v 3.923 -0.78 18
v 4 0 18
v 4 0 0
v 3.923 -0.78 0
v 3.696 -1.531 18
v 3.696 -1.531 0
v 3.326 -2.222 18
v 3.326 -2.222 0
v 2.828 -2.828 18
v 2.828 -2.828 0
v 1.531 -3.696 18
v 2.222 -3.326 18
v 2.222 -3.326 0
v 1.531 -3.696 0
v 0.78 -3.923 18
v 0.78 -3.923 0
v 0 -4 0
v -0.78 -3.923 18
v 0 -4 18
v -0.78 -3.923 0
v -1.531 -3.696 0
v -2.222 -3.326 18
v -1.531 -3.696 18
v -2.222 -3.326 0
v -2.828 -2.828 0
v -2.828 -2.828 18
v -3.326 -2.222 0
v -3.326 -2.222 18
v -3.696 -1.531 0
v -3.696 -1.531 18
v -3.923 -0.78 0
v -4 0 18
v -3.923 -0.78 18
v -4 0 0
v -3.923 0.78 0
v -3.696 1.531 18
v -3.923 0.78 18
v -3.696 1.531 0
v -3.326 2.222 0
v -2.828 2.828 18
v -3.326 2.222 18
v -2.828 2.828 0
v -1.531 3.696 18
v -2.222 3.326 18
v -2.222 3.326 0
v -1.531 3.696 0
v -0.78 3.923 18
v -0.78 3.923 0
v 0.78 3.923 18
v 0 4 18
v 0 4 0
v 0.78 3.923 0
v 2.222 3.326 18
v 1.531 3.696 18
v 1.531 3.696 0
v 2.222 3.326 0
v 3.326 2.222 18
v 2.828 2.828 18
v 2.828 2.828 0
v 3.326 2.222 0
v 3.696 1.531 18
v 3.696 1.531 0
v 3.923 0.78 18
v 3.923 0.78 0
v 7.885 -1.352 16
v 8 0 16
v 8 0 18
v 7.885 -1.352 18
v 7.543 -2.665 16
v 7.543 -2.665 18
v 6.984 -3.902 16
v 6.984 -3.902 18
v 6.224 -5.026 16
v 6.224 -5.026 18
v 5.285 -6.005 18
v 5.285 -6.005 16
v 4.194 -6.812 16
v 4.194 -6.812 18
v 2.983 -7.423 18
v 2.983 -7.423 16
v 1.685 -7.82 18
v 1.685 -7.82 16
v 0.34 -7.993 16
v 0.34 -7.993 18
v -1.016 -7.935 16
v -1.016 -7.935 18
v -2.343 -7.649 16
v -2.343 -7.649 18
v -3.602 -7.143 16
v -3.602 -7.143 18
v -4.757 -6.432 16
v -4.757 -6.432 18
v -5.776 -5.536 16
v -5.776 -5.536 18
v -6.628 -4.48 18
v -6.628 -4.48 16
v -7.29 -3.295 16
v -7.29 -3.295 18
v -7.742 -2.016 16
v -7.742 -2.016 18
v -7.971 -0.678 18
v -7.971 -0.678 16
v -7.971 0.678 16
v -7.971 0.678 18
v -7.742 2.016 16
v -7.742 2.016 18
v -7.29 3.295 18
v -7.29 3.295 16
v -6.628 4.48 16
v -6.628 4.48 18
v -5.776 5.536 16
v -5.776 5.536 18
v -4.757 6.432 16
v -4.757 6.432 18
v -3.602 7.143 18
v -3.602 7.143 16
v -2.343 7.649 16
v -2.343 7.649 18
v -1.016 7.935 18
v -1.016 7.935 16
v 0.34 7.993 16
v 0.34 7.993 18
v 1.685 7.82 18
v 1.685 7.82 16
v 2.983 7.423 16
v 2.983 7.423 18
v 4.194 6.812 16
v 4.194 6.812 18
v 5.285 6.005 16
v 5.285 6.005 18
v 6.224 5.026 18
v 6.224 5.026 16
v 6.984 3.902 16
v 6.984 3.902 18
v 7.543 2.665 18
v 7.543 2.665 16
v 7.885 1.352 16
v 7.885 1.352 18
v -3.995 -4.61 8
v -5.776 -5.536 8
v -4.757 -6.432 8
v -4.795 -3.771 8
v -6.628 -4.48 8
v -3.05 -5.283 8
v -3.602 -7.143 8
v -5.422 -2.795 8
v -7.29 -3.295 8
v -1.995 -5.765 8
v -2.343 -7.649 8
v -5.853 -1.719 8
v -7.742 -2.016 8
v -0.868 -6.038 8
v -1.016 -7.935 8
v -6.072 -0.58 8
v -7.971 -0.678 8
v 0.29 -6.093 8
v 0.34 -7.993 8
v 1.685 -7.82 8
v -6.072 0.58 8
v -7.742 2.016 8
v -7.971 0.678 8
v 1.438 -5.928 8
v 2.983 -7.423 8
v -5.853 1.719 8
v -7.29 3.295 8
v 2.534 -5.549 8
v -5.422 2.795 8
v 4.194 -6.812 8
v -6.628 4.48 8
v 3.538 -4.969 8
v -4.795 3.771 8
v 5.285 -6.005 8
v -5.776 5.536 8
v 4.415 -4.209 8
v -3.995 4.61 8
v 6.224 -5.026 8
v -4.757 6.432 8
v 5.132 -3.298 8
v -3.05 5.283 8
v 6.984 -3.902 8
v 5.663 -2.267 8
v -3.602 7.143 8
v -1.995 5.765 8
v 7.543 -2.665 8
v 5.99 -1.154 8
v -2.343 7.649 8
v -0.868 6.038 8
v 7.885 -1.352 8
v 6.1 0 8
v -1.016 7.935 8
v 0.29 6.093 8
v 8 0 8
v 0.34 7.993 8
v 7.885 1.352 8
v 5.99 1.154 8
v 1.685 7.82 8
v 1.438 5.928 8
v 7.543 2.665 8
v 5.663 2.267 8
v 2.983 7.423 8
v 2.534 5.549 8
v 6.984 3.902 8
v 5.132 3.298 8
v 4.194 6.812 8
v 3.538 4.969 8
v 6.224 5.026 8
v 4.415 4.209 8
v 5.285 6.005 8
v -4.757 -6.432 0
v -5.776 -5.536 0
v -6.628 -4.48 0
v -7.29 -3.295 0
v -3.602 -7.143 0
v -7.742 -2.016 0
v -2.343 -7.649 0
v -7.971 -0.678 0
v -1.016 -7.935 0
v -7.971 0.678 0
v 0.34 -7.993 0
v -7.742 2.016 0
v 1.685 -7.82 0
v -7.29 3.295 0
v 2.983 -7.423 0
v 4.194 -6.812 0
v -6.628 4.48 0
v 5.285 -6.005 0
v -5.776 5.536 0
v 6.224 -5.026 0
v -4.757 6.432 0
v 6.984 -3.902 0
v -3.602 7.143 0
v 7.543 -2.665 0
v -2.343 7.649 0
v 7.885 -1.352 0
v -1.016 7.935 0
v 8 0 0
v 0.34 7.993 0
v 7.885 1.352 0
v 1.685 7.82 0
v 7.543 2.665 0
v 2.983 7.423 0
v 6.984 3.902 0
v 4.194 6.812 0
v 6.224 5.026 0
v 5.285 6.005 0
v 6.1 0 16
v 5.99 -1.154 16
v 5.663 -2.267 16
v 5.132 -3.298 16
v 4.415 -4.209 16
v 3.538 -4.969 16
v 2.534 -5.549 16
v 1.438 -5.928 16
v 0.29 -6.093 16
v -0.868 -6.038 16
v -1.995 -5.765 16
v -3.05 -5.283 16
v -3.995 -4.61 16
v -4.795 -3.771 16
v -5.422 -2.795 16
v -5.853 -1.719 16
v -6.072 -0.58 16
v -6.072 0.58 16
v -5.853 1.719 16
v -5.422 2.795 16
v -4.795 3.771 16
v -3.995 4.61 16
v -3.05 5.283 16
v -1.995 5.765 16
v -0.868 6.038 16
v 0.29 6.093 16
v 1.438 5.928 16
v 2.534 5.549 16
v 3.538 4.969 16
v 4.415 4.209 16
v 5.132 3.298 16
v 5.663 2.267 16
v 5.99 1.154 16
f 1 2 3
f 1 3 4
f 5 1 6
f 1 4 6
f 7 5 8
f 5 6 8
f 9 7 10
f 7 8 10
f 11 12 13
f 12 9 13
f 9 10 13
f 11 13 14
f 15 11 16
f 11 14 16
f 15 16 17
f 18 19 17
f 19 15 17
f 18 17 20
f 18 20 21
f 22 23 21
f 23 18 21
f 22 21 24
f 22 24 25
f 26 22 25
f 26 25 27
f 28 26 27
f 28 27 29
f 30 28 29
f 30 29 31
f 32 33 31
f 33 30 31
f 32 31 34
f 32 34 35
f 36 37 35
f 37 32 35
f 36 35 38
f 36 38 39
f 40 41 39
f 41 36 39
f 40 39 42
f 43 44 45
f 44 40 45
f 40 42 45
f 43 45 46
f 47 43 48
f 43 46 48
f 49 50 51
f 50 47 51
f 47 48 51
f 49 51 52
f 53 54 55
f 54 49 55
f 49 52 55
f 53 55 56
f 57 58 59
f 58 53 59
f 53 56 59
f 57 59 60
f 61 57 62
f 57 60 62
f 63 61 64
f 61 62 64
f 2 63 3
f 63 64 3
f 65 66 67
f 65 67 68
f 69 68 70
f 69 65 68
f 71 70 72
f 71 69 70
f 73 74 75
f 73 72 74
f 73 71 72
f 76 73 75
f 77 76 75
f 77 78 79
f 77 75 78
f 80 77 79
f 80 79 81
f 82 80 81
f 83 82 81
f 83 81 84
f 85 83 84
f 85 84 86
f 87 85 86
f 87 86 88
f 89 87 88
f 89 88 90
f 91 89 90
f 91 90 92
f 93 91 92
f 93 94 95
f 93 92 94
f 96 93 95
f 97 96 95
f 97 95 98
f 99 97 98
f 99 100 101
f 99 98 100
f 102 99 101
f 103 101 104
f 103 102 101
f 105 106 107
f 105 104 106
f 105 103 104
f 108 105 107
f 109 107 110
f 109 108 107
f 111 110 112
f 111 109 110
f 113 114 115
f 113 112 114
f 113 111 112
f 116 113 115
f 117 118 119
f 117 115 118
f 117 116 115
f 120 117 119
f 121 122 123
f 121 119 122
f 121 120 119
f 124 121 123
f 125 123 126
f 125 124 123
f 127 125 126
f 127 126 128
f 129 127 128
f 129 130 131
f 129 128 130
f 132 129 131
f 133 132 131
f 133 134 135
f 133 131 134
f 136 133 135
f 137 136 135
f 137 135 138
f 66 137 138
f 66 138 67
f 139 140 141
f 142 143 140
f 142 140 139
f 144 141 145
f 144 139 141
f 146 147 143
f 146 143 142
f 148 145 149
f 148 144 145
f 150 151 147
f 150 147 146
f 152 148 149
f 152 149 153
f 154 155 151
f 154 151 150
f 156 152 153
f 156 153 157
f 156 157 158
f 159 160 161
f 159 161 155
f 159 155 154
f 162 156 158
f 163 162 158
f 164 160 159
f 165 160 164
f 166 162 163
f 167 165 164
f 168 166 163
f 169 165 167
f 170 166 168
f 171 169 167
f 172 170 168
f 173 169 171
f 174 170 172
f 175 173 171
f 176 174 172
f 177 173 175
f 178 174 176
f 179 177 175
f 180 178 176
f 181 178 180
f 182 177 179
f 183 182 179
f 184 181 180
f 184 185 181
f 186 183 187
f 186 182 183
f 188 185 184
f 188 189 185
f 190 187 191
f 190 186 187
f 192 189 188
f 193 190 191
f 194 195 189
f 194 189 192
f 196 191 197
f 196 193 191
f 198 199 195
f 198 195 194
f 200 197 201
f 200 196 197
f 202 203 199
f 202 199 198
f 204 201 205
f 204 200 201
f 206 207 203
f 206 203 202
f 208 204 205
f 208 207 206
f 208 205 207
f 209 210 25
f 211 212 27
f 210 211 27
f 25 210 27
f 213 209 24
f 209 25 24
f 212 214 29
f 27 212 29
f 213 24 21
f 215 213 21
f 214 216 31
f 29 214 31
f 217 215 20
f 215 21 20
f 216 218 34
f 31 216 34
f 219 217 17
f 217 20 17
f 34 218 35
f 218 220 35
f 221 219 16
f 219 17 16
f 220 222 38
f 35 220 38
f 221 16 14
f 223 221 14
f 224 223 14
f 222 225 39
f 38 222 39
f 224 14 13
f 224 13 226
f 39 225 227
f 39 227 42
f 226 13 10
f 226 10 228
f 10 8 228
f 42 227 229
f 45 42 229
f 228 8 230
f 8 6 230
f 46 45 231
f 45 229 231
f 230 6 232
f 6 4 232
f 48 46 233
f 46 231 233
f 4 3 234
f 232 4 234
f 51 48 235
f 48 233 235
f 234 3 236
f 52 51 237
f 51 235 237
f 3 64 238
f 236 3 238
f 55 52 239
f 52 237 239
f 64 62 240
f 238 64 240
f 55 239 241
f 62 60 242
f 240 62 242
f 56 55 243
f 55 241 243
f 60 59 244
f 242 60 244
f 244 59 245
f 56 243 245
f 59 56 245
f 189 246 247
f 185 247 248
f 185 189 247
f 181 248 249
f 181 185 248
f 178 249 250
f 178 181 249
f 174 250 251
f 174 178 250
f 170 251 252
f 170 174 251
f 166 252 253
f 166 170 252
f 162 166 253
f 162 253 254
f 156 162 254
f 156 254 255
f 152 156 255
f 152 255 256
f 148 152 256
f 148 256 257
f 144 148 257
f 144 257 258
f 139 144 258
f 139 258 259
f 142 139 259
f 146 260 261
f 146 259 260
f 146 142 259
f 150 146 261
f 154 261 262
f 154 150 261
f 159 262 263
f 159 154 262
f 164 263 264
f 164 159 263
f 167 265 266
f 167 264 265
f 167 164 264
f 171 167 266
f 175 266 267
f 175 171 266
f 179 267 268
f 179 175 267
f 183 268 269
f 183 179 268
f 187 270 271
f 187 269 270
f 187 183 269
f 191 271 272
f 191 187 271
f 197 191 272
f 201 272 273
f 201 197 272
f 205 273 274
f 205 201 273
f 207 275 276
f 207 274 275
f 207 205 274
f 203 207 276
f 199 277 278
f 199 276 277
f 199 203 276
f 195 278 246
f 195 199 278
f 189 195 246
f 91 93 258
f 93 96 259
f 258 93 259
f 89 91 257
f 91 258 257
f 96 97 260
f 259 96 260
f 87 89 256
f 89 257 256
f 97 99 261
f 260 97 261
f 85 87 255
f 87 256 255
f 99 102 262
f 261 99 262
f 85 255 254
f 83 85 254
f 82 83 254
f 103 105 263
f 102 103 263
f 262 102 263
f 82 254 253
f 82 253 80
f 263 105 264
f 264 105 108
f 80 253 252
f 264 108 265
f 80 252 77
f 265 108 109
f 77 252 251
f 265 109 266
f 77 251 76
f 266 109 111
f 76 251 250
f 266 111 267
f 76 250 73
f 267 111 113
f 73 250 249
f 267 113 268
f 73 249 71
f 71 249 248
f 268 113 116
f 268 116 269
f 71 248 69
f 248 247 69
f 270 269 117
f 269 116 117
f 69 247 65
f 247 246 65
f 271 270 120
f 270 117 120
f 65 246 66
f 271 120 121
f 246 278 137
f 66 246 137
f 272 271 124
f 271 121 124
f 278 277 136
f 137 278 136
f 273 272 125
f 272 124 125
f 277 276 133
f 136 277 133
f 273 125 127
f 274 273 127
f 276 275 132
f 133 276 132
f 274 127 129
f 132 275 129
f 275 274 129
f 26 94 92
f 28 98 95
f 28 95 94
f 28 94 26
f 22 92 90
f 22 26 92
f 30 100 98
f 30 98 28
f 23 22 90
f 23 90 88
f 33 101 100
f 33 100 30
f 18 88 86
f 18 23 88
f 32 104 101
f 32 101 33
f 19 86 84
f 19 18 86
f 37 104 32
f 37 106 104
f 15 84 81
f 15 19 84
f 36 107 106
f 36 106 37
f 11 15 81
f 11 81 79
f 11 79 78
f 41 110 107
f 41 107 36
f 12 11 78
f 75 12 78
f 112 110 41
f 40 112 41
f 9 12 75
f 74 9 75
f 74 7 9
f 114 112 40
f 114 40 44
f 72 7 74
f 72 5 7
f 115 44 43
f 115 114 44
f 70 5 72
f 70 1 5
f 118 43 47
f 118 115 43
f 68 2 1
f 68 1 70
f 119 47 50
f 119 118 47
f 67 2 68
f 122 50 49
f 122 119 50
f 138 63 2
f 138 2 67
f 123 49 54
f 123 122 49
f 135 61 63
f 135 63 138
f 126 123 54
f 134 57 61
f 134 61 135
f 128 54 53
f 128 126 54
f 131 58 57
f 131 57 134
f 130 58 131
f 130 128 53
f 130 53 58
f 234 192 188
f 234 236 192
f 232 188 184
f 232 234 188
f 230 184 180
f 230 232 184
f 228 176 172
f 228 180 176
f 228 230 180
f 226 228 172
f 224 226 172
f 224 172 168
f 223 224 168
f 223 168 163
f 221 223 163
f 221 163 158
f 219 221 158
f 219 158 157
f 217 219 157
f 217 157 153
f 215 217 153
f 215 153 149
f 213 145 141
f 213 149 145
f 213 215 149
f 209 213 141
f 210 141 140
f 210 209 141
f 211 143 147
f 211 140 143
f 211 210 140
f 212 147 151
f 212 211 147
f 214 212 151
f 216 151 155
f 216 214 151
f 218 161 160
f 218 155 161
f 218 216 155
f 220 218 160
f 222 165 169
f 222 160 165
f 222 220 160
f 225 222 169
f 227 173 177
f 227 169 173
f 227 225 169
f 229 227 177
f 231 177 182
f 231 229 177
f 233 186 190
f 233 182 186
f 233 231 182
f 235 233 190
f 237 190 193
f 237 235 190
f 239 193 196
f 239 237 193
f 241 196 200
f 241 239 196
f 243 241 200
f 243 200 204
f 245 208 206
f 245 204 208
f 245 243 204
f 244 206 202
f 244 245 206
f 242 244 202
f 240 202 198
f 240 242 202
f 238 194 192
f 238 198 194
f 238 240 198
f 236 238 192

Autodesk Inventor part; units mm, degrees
ref_plane "YZ Plane" through (0, 0, 0) normal (1, 0, 0) x (0, 1, 0)
ref_plane "XZ Plane" through (0, 0, 0) normal (0, 1, 0) x (-1, 0, 0)
ref_plane "XY Plane" through (0, 0, 0) normal (0, 0, 1) x (1, 0, 0)
sketch "Sketch1" plane through (0, 0, 0) normal (0, 0, 1) x (1, 0, 0)
  circle A0 centre (0, 0) radius 4
  circle A1 centre (0, 0) radius 8
  circle A2 centre (0, 0) radius 6.1
  dimension "d0" = 8
  dimension "d1" = 16
  dimension "d2" = 12.2
extrude "Extrusion1" add sketch "Sketch1" along normal blind 8 contours A1 | A2
extrude "Extrusion2" add sketch "Sketch1" along normal blind 16 contours A2
sketch "Sketch2" plane through (0, 0, 16) normal (0, 0, 1) x (1, 0, 0)
  circle A0 centre (0, 0) radius 8 projected
  circle A1 centre (0, 0) radius 4 projected
extrude "Extrusion3" add sketch "Sketch2" along normal blind 2
properties part number "Polea" material "Aluminio 6061"
